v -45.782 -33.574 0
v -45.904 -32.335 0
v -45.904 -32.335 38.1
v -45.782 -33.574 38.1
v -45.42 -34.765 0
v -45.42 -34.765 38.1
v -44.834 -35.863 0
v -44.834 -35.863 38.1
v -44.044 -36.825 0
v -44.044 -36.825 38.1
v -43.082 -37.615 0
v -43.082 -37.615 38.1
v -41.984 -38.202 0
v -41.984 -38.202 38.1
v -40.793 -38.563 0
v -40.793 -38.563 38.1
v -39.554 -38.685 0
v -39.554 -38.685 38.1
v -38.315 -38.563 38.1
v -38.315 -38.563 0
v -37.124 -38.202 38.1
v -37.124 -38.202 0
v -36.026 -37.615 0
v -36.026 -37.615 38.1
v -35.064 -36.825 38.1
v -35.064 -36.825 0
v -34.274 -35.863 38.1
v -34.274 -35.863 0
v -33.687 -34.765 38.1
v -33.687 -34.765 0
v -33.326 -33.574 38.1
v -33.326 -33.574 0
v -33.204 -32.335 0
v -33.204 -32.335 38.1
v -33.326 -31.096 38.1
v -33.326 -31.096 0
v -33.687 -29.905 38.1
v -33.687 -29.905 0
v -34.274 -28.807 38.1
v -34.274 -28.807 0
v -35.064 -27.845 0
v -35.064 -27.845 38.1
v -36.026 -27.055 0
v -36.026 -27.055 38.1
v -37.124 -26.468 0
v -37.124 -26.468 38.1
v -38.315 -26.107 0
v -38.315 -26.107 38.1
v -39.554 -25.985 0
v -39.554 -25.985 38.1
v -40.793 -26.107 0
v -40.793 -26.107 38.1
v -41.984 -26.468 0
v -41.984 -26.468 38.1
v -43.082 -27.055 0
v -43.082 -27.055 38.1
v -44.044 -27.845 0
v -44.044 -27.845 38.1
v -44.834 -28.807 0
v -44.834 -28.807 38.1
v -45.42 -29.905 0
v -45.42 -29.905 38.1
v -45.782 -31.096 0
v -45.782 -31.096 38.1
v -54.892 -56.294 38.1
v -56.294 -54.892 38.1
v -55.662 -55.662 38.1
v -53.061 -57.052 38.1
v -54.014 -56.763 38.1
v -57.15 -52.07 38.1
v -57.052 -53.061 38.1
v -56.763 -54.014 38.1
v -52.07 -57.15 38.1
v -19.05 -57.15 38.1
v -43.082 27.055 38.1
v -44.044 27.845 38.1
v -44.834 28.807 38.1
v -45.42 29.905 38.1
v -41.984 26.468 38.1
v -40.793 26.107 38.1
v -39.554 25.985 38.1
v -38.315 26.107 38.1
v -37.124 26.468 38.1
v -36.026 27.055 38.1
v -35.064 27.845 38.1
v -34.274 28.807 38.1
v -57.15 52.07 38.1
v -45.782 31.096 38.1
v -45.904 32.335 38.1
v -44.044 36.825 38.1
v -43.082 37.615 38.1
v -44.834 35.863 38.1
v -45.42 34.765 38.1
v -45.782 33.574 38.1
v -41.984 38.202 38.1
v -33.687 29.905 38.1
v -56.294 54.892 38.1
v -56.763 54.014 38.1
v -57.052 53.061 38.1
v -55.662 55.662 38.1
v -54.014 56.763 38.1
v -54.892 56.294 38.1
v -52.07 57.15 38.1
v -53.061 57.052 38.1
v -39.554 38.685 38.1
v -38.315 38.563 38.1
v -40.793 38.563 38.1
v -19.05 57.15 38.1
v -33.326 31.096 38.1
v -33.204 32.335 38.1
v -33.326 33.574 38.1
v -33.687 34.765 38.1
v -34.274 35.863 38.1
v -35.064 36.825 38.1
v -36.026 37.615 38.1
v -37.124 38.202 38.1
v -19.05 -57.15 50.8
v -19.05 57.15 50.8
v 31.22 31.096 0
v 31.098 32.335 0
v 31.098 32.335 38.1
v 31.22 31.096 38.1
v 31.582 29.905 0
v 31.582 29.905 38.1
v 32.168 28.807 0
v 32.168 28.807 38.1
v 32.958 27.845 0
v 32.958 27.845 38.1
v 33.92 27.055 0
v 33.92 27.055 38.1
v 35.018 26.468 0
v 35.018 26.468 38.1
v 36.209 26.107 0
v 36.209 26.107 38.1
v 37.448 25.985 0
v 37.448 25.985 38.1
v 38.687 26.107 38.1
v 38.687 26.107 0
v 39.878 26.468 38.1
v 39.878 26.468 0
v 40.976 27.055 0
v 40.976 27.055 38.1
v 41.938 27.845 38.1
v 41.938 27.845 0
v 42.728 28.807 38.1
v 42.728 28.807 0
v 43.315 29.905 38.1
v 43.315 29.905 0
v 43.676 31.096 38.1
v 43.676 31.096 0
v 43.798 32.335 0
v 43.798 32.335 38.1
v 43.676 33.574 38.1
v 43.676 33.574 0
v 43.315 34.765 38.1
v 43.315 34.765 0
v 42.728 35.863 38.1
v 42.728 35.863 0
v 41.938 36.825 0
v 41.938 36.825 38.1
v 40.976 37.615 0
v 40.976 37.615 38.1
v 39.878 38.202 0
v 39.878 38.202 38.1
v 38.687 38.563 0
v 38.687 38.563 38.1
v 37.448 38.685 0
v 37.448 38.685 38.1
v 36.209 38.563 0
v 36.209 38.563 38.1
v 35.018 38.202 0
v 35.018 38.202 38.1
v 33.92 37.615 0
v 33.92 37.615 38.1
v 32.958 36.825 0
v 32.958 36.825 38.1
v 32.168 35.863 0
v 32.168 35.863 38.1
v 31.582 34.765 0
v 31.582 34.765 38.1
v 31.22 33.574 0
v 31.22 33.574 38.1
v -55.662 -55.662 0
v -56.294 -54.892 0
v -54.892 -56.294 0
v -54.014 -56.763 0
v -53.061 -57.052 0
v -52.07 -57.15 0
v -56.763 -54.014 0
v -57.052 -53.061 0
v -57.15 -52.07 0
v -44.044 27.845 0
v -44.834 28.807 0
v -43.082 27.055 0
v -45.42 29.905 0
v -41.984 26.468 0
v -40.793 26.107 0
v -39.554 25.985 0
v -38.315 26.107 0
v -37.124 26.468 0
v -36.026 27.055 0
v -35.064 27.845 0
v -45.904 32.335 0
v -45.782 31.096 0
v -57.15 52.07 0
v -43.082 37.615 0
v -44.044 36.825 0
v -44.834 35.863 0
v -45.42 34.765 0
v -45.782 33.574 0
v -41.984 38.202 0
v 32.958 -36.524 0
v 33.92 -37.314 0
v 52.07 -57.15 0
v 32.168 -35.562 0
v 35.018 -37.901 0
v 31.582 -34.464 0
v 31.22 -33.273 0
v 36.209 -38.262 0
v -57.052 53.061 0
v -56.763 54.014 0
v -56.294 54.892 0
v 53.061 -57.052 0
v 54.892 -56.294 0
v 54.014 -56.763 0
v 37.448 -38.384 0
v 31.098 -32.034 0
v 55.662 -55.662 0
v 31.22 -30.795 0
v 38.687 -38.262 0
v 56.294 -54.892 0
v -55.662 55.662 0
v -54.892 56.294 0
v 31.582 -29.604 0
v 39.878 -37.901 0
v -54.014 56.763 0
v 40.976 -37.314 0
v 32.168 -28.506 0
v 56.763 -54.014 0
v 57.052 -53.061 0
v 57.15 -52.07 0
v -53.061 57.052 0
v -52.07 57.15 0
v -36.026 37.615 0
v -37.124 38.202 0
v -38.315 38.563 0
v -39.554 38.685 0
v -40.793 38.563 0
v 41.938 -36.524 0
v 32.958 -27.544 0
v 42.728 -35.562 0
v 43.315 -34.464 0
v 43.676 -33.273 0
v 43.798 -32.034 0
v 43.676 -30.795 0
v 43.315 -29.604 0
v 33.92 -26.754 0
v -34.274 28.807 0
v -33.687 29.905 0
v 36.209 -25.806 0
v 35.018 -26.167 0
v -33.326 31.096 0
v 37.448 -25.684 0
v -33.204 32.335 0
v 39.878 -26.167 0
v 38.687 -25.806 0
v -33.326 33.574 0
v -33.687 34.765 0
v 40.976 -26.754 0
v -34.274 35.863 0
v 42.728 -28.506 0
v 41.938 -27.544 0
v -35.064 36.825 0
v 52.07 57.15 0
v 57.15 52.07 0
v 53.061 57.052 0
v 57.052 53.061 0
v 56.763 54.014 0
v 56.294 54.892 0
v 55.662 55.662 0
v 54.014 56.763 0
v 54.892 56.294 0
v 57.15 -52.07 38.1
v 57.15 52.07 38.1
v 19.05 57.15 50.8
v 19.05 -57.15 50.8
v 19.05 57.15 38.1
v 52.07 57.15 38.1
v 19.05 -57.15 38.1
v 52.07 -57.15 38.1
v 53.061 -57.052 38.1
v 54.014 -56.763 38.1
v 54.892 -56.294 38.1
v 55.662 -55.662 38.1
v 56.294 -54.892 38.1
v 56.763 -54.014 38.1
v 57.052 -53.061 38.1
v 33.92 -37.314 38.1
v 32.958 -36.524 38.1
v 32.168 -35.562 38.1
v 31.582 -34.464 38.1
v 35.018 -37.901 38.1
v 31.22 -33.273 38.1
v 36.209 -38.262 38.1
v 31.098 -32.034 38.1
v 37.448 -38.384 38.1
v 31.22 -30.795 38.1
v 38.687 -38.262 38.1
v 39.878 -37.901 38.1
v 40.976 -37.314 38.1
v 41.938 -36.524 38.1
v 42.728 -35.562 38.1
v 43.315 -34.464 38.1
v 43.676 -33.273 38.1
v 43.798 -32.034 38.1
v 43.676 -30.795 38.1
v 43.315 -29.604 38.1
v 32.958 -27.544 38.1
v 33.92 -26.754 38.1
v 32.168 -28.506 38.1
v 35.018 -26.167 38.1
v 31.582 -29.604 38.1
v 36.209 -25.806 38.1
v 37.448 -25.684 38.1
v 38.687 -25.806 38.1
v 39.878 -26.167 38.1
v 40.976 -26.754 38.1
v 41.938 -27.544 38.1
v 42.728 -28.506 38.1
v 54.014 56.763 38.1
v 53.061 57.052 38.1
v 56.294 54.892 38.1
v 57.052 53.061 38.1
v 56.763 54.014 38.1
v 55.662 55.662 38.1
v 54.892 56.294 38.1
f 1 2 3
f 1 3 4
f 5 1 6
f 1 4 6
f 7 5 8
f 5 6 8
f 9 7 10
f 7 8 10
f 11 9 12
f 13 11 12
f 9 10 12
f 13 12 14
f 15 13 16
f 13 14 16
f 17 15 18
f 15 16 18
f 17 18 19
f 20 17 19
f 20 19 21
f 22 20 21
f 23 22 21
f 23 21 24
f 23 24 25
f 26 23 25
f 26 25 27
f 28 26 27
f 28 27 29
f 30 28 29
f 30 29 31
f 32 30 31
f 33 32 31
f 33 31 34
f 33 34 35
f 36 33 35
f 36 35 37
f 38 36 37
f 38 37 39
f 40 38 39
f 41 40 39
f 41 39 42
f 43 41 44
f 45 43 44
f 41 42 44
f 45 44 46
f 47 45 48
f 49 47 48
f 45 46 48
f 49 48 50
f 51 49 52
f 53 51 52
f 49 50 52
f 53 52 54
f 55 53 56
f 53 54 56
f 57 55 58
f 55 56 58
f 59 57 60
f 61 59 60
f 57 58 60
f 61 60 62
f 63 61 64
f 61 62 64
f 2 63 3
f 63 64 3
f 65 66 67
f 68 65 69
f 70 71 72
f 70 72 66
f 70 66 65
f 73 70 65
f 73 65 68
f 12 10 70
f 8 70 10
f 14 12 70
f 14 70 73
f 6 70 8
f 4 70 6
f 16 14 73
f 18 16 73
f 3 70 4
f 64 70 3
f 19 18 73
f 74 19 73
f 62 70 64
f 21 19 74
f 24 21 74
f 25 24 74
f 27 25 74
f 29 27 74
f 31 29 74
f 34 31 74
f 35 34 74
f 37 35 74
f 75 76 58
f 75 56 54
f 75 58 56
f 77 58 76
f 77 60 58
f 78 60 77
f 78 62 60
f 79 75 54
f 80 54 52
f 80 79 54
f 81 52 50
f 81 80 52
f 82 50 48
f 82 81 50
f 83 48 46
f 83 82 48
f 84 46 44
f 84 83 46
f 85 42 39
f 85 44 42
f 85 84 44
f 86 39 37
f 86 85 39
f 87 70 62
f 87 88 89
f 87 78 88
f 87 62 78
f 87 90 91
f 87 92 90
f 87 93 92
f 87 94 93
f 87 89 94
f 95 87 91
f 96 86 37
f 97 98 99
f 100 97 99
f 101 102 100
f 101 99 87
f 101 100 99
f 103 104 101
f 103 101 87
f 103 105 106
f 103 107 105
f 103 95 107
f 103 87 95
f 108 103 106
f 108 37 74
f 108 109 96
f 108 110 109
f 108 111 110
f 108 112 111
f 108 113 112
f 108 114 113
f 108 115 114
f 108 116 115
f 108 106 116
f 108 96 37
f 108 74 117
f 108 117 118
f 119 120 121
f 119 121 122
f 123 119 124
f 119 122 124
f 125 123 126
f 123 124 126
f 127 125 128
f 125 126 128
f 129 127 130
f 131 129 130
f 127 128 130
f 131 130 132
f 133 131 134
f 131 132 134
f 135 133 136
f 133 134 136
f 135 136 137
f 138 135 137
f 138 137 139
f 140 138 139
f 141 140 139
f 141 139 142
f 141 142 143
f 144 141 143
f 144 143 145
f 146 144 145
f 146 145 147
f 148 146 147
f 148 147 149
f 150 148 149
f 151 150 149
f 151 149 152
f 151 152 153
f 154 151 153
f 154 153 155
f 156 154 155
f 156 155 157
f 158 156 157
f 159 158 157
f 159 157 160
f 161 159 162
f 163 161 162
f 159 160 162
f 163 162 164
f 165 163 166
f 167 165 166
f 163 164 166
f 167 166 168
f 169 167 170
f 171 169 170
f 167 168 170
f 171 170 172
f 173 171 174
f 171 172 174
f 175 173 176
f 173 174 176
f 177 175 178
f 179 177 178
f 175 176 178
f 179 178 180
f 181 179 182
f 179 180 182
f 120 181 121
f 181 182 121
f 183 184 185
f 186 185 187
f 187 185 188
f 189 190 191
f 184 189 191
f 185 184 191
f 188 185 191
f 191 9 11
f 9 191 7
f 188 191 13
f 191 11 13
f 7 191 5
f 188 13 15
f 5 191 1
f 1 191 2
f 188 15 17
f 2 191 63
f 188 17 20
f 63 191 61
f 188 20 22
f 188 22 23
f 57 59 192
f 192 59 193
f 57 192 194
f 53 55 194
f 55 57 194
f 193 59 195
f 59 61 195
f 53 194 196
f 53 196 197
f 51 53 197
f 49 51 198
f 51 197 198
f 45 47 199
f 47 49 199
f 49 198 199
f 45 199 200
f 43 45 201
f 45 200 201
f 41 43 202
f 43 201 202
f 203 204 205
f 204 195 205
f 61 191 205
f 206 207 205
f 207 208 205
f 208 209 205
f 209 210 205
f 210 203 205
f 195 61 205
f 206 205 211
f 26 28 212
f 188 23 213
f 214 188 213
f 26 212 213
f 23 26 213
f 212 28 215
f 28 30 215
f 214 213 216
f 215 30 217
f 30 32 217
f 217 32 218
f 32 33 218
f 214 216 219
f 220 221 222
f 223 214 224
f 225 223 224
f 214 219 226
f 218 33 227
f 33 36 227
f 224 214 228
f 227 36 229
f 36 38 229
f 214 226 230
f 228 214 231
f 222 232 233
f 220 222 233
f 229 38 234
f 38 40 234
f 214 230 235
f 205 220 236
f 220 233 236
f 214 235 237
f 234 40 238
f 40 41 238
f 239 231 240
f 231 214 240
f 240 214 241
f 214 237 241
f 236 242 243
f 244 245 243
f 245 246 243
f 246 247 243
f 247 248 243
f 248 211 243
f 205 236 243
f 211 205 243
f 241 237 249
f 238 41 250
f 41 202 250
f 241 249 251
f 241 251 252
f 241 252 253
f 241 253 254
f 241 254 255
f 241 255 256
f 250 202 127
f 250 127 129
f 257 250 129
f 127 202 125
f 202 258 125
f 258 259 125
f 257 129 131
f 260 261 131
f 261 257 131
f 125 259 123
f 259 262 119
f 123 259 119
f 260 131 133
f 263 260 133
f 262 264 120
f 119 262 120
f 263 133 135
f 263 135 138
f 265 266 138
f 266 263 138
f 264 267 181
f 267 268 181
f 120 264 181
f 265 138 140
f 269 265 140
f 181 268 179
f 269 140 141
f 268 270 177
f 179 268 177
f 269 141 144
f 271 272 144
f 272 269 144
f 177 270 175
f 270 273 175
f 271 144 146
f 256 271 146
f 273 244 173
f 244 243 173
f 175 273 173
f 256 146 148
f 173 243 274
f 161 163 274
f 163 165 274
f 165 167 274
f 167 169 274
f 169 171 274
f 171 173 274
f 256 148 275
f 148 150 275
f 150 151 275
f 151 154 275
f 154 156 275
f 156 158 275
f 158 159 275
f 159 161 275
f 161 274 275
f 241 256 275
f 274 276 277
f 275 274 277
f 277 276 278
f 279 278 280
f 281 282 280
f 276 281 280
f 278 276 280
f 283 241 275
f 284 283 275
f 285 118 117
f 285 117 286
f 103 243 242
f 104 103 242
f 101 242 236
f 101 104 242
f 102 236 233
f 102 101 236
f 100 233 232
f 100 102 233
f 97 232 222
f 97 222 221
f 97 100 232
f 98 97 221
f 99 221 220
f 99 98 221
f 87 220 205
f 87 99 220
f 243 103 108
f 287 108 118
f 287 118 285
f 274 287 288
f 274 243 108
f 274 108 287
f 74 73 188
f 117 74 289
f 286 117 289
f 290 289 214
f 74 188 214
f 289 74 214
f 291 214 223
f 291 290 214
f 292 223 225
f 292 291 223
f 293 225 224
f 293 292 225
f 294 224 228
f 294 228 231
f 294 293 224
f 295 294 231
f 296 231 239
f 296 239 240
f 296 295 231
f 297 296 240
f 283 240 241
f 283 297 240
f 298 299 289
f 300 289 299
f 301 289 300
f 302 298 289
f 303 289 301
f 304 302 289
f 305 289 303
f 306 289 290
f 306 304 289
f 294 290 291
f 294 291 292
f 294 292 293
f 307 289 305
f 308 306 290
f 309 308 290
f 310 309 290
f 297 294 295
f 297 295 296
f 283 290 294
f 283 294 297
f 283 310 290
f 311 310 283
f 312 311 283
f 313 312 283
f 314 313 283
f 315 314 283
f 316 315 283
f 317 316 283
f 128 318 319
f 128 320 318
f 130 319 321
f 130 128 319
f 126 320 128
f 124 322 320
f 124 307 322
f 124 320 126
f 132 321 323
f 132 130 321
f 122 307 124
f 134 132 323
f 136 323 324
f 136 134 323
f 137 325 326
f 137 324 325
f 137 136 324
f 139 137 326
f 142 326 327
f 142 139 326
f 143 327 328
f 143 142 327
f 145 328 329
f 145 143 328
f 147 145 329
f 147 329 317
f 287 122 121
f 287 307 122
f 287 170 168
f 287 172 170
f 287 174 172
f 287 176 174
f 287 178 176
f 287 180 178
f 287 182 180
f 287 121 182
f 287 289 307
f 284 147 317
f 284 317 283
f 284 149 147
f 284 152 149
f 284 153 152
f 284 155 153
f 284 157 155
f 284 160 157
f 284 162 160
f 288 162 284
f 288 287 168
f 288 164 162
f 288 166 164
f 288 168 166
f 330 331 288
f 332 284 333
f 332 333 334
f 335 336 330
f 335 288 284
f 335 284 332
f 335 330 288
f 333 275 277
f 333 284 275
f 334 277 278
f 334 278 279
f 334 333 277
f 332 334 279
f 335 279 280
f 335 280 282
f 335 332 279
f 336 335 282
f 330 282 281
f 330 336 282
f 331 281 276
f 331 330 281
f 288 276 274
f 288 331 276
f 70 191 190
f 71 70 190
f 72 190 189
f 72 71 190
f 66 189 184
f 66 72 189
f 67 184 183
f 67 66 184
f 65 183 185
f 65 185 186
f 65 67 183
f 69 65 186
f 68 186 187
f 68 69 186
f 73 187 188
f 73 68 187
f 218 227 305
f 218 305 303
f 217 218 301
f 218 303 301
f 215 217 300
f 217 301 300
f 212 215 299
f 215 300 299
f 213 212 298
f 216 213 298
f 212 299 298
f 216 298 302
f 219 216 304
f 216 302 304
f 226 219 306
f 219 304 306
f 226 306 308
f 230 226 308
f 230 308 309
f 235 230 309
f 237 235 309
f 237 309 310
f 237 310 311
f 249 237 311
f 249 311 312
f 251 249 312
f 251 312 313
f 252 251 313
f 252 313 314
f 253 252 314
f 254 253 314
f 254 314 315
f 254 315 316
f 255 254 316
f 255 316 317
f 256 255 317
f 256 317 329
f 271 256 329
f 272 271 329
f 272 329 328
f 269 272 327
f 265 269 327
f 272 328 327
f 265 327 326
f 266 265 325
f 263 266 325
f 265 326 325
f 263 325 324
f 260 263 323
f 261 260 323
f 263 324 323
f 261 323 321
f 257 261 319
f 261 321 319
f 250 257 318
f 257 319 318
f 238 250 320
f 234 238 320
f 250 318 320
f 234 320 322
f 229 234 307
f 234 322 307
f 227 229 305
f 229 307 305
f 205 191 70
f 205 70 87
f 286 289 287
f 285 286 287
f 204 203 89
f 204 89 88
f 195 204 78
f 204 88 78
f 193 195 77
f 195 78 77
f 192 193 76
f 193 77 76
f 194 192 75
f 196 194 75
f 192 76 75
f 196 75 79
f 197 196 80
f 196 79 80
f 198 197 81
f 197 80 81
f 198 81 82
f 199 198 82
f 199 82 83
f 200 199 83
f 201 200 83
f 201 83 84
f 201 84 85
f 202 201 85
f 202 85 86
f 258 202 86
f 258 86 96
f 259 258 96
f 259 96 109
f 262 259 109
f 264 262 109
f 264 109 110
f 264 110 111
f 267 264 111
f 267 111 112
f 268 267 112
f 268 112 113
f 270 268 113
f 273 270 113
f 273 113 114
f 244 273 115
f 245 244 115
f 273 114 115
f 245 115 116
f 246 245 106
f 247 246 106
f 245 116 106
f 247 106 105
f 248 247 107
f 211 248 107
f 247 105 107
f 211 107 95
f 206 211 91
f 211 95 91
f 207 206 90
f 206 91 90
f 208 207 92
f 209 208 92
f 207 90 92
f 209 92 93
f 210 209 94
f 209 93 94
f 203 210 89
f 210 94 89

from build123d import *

# Parameters (mm, degrees)
F0_W     = 38.1
F0_H     = 114.3
F3_DEPTH = 50.8
F2_W     = 38.1
F2_H     = 114.3
F4_DEPTH = 38.1
F1_W     = 38.1
F1_H     = 114.3
F5_DEPTH = 38.1
F6_D     = 12.7
F7_D     = 12.7
F8_D     = 12.7
F9_D     = 12.7
F10_R    = 5.08
F11_R    = 5.08
F12_R    = 5.08
F13_R    = 5.08


with BuildPart() as f3:
    # F0 (on Top) → F3 (new body)
    with BuildSketch(Plane.XY):
        Rectangle(F0_W, F0_H)
    extrude(amount=F3_DEPTH)

    # F2 (on Top) → F4 (join)
    with BuildSketch(Plane.XY):
        with Locations((38.1, 0)):
            Rectangle(F2_W, F2_H)
    extrude(amount=F4_DEPTH)

    # F1 (on Top) → F5 (join)
    with BuildSketch(Plane.XY):
        with Locations((-38.1, 0)):
            Rectangle(F1_W, F1_H)
    extrude(amount=F5_DEPTH)

    # F6 (through all)
    with Locations(Plane(origin=(0, 0, 0), x_dir=(1, 0, 0), z_dir=(0, 0, -1))):
        with Locations((37.4482907355, -32.3348678648)):
            Hole(F6_D / 2)

    # F7 (through all)
    with Locations(Plane(origin=(0, 0, 0), x_dir=(1, 0, 0), z_dir=(0, 0, -1))):
        with Locations((37.4482907355, 32.0340804756)):
            Hole(F7_D / 2)

    # F8 (through all)
    with Locations(Plane(origin=(0, 0, 0), x_dir=(1, 0, 0), z_dir=(0, 0, -1))):
        with Locations((-39.5538173616, -32.3348678648)):
            Hole(F8_D / 2)

    # F9 (through all)
    with Locations(Plane(origin=(0, 0, 0), x_dir=(1, 0, 0), z_dir=(0, 0, -1))):
        with Locations((-39.5538173616, 32.3348678648)):
            Hole(F9_D / 2)

    # F10
    f10_edges = [f3.edges().sort_by_distance(p)[0] for p in [
        (-57.15, -57.15, 19.05),
    ]]
    fillet(f10_edges, radius=F10_R)

    # F11
    f11_edges = [f3.edges().sort_by_distance(p)[0] for p in [
        (57.15, -57.15, 19.05),
    ]]
    fillet(f11_edges, radius=F11_R)

    # F12
    f12_edges = [f3.edges().sort_by_distance(p)[0] for p in [
        (57.15, 57.15, 19.05),
    ]]
    fillet(f12_edges, radius=F12_R)

    # F13
    f13_edges = [f3.edges().sort_by_distance(p)[0] for p in [
        (-57.15, 57.15, 19.05),
    ]]
    fillet(f13_edges, radius=F13_R)


solid = f3.part
